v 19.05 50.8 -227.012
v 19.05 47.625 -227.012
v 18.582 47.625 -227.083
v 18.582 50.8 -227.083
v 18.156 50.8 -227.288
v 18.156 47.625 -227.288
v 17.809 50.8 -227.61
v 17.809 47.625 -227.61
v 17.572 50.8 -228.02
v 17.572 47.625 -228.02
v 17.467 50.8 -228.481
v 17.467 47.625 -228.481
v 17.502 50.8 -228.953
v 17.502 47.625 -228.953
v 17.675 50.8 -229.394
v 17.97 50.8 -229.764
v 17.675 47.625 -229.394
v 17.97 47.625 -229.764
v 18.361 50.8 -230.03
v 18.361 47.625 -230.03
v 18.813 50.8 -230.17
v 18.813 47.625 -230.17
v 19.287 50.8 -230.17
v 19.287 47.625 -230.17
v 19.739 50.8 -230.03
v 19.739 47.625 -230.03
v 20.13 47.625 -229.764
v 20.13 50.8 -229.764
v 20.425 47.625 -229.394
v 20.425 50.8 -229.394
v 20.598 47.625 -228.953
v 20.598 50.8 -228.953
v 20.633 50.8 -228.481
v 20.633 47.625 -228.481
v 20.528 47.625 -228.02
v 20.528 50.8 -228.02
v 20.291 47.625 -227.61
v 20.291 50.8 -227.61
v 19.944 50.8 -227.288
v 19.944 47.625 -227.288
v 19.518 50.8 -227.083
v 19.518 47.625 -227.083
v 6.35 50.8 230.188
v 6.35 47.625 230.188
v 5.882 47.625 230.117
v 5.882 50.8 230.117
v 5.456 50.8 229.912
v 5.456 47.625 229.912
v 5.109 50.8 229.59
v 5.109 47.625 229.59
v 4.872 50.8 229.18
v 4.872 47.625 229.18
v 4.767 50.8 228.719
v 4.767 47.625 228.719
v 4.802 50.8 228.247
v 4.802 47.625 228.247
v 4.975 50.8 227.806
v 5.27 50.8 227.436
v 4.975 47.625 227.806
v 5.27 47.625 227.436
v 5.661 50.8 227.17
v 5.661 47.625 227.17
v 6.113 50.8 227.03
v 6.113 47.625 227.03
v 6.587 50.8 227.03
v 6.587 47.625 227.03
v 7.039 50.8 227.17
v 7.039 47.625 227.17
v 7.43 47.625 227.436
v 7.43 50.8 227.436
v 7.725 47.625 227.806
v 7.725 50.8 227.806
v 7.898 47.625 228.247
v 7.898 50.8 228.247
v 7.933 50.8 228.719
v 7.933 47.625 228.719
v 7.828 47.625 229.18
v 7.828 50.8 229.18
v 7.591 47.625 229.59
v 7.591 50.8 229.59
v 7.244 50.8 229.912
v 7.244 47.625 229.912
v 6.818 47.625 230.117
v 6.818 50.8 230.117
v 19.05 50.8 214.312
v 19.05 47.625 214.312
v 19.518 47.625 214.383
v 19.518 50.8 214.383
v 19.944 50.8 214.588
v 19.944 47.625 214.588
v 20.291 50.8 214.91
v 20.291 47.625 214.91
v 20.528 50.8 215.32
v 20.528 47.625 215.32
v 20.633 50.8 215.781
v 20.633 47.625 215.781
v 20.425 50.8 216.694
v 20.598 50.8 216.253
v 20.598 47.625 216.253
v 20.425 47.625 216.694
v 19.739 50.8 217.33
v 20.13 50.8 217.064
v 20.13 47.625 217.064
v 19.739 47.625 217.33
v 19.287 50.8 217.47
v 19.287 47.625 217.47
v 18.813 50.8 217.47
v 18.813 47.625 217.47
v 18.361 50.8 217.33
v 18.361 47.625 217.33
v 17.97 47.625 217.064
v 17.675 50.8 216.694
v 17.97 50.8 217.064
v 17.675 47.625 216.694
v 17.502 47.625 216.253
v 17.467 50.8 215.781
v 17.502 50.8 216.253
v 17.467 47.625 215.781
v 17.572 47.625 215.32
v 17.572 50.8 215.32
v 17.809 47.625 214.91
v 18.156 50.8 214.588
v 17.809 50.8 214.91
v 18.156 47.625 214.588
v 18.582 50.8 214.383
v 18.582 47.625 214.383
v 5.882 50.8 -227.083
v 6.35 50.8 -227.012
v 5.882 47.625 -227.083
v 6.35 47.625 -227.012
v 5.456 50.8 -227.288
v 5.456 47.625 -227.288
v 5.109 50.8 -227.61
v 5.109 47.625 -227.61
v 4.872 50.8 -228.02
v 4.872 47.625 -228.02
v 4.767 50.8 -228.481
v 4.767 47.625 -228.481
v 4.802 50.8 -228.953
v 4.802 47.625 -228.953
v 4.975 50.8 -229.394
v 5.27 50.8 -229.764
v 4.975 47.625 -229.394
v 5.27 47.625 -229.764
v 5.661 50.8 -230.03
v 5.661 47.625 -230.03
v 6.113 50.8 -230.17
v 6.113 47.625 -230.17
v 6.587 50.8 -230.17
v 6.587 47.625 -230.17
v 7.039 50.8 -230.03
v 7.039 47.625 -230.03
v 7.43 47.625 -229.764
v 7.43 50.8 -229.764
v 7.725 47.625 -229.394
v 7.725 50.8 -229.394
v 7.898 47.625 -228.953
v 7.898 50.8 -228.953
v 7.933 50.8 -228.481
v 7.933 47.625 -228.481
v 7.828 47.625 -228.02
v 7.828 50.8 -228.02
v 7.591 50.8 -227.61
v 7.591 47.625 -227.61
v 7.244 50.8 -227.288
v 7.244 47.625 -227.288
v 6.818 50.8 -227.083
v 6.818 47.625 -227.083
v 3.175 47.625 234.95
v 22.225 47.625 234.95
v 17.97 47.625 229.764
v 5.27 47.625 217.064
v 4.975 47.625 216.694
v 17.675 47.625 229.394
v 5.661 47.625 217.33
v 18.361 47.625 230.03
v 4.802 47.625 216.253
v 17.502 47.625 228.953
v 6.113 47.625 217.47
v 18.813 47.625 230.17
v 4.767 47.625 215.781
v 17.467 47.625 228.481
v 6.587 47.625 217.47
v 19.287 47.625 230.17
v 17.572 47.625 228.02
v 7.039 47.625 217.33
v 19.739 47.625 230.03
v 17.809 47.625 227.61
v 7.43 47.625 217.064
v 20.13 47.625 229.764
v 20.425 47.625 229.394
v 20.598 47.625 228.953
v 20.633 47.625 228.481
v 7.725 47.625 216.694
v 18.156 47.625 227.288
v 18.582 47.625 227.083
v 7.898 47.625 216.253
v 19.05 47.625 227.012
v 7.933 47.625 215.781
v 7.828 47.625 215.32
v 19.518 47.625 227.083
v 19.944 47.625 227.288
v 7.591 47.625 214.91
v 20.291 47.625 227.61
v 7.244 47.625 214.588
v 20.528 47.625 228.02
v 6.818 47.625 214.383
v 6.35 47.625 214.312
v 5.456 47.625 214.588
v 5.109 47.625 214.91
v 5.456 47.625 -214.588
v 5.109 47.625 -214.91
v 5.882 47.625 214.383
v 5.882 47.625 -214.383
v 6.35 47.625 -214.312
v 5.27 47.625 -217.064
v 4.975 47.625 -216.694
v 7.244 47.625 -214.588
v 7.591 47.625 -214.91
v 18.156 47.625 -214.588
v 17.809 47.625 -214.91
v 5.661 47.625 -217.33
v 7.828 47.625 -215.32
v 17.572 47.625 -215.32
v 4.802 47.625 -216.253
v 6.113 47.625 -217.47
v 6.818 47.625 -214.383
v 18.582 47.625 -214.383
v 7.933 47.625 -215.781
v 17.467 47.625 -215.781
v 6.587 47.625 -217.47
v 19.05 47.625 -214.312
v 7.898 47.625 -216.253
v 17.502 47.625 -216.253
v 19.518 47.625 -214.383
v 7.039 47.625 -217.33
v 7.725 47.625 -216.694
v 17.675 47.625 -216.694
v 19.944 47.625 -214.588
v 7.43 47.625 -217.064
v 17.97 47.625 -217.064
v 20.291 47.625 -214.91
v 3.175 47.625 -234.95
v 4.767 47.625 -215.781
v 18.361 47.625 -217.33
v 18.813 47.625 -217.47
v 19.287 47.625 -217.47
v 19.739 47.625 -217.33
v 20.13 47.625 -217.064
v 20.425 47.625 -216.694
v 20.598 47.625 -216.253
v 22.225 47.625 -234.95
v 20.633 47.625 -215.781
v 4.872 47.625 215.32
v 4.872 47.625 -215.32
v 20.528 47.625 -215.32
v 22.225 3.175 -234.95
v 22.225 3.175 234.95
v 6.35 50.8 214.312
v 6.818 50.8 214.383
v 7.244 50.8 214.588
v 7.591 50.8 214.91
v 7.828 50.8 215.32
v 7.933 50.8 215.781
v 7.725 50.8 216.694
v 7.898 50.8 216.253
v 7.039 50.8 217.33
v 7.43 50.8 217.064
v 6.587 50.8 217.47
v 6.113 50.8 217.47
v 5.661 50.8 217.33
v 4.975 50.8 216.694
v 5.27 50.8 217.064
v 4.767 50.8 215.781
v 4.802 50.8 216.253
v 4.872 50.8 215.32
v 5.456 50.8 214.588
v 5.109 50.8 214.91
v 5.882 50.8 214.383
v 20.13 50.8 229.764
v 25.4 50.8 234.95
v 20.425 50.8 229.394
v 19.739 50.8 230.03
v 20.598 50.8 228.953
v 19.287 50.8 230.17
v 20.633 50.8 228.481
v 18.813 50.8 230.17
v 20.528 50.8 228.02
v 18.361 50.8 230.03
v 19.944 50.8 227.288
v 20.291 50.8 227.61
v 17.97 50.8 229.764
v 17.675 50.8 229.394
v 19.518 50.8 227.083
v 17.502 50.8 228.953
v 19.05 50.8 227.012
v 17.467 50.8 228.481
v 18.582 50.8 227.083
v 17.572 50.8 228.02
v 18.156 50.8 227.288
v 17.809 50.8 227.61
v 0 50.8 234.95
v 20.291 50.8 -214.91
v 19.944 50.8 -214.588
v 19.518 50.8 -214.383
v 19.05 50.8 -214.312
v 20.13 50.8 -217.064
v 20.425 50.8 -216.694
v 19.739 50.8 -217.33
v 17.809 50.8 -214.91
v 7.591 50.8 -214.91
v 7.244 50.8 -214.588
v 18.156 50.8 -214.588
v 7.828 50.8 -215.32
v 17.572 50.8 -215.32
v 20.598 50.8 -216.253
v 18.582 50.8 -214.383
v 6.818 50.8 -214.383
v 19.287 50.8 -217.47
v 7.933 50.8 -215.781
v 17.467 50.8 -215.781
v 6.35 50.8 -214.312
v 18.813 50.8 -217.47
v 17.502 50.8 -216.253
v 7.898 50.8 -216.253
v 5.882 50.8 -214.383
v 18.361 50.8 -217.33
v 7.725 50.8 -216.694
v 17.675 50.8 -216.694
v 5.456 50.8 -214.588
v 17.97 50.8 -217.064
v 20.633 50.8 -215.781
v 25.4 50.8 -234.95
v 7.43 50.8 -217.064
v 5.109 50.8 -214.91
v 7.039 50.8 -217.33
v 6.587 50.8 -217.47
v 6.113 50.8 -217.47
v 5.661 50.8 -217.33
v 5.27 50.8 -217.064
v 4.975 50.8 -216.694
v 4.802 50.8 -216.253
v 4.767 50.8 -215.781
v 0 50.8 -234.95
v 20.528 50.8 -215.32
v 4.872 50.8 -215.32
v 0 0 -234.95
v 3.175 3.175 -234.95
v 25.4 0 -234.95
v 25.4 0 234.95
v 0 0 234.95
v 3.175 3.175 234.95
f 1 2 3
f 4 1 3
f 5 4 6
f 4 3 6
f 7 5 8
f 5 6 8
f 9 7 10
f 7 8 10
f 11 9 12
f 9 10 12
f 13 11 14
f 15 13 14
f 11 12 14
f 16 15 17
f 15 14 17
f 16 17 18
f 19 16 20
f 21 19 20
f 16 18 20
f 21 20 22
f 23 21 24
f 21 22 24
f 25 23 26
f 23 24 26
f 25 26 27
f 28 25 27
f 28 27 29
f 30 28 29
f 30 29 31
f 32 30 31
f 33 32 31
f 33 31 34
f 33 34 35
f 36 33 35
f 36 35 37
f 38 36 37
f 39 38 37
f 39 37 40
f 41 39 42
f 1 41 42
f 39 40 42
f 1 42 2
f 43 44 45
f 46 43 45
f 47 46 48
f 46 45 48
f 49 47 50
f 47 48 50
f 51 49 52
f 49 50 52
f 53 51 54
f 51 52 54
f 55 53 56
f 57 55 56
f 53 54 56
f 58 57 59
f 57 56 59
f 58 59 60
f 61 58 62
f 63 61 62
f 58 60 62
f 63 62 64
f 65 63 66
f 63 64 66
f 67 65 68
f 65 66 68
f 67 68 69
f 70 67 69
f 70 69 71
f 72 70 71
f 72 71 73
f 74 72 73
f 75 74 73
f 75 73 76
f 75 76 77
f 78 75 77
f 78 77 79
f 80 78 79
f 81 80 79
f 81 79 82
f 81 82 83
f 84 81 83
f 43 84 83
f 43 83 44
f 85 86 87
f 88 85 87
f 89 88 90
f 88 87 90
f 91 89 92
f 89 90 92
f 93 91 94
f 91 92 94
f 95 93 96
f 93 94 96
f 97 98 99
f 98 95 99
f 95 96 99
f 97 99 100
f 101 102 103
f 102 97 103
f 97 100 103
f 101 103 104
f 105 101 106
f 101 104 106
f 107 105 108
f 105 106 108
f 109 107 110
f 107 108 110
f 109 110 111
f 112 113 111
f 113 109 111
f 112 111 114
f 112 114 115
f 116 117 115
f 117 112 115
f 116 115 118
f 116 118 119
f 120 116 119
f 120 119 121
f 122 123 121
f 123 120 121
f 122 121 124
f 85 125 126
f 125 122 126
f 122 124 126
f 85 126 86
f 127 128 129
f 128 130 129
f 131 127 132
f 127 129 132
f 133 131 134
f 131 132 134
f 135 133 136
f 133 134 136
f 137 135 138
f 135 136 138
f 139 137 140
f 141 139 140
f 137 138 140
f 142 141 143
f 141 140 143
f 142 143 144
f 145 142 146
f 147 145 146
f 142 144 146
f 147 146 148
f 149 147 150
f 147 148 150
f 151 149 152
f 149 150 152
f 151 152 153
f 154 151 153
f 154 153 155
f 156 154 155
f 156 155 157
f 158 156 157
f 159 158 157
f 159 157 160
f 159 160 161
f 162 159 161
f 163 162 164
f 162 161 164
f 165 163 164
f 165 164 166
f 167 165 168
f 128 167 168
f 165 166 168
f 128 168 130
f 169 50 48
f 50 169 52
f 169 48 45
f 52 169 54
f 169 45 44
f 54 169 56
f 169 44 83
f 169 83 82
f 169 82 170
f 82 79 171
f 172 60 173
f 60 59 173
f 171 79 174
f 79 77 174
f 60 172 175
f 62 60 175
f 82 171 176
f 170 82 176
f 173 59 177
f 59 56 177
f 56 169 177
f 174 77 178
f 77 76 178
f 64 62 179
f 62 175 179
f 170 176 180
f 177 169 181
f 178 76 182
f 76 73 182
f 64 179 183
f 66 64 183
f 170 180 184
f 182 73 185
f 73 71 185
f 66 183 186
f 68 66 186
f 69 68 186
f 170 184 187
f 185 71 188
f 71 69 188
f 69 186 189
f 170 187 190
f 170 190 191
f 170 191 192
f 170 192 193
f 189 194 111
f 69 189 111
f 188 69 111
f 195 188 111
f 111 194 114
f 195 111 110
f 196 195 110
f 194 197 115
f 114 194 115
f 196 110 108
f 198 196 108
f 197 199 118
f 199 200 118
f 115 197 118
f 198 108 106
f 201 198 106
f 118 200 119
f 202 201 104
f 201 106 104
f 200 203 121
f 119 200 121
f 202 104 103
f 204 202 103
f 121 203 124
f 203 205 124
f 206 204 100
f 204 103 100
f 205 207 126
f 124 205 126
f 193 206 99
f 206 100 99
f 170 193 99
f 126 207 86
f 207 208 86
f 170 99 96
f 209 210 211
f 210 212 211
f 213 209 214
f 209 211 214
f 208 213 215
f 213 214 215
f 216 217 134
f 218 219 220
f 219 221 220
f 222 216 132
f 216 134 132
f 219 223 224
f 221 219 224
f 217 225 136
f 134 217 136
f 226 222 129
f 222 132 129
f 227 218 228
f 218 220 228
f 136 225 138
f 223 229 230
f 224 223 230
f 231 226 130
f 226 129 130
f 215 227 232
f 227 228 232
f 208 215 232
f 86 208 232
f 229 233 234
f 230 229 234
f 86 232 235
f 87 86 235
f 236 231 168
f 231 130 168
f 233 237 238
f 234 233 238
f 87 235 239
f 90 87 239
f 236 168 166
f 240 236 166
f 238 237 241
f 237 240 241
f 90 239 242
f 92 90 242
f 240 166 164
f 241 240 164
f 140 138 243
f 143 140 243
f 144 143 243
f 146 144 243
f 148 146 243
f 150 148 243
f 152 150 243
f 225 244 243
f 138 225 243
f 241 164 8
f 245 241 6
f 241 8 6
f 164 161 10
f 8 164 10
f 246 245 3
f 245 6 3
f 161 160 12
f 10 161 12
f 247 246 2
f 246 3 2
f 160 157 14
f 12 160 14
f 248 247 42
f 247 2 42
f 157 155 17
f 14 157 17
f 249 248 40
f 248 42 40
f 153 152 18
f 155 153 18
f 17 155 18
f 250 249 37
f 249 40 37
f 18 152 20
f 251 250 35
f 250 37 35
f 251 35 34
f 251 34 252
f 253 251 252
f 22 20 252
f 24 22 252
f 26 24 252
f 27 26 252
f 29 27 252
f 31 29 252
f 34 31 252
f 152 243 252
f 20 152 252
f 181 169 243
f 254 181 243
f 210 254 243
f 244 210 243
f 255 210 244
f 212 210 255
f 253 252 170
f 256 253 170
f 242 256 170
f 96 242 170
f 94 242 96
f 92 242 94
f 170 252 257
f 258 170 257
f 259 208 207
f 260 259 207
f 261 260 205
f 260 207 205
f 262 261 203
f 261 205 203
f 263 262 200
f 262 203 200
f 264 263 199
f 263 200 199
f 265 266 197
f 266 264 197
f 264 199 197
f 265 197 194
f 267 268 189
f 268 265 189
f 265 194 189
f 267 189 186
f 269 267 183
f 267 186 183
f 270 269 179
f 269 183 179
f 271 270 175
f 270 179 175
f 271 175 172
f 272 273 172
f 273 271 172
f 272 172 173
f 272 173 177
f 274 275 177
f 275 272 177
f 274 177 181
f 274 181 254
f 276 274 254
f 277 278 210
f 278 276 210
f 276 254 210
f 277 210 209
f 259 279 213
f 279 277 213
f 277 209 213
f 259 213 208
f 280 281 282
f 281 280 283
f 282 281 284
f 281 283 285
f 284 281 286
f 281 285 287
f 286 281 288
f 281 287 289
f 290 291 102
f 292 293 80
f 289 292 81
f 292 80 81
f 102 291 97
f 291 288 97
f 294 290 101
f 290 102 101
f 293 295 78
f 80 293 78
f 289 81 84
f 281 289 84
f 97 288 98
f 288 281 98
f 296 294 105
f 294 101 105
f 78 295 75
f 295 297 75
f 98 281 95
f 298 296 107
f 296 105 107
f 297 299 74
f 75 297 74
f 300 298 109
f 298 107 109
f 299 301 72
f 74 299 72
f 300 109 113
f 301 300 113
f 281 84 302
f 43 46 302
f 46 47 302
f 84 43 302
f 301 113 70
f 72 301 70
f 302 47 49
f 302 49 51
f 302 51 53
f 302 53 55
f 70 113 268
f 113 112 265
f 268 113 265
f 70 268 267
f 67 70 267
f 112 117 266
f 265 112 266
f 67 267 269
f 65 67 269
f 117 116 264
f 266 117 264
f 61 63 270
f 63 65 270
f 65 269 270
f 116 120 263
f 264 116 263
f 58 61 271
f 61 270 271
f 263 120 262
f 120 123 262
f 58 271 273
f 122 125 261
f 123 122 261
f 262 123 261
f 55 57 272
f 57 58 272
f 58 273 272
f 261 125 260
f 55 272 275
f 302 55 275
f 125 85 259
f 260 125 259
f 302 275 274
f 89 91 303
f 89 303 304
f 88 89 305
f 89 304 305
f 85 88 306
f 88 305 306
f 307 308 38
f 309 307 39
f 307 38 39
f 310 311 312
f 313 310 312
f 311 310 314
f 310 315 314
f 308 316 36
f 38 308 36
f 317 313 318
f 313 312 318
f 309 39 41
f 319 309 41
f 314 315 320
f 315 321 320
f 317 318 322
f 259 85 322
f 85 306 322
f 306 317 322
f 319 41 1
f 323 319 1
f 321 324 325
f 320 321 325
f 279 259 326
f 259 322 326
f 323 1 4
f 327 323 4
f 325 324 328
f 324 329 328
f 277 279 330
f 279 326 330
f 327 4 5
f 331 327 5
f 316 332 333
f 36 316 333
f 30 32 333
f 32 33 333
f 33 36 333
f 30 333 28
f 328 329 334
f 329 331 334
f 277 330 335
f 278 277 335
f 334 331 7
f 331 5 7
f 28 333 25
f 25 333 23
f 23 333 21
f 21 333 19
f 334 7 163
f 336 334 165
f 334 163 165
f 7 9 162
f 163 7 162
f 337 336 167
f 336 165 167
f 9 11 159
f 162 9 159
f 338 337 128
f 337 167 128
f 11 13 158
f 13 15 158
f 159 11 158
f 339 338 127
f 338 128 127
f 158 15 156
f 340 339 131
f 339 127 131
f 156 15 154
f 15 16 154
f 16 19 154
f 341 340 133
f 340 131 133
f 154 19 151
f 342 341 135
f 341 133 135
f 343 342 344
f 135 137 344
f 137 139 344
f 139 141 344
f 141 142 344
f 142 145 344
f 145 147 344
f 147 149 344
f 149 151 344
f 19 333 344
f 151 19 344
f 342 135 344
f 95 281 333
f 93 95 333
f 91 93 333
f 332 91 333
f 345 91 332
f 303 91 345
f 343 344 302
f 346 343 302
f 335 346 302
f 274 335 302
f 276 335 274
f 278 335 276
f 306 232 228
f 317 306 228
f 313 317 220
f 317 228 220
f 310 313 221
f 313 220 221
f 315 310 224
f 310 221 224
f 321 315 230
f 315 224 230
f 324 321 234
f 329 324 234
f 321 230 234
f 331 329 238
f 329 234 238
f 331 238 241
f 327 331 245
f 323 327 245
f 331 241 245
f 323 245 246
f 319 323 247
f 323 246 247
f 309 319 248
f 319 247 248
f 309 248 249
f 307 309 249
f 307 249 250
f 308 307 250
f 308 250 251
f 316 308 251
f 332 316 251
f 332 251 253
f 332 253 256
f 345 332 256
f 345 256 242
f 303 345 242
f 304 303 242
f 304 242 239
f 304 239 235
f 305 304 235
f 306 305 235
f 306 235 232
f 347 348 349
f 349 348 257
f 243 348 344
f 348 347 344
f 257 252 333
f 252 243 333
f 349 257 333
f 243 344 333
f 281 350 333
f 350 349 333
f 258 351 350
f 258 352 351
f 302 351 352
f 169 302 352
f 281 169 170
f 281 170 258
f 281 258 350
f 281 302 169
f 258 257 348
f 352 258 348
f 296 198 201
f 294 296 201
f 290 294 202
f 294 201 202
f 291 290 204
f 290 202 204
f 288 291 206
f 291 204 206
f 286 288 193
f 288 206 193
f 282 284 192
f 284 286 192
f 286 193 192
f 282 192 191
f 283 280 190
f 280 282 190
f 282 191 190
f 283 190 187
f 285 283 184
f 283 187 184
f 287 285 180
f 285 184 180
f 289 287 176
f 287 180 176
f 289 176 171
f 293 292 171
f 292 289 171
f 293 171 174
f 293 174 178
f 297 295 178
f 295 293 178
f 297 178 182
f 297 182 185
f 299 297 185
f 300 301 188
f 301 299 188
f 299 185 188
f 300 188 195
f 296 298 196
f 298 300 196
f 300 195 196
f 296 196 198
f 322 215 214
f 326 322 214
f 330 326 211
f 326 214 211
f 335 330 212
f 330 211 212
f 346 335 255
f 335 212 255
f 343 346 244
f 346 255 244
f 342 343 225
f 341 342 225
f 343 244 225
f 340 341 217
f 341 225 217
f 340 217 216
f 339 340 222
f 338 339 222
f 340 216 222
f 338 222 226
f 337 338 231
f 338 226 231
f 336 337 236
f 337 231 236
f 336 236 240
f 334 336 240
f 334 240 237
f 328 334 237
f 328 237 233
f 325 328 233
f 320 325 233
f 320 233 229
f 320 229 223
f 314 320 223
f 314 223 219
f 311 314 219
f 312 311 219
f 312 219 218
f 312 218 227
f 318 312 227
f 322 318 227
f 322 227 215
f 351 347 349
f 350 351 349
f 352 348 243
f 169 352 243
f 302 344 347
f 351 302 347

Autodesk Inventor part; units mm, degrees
ref_plane "YZ Plane" through (0, 0, 0) normal (1, 0, 0) x (0, 1, 0)
ref_plane "XZ Plane" through (0, 0, 0) normal (0, 1, 0) x (-1, 0, 0)
ref_plane "XY Plane" through (0, 0, 0) normal (0, 0, 1) x (1, 0, 0)
sketch "Sketch1" plane through (0, 0, 0) normal (0, 0, 1) x (1, 0, 0)
  line L0 (0, 0) -> (25.4, 0)
  line L1 (25.4, 0) -> (25.4, 50.8)
  line L2 (25.4, 50.8) -> (0, 50.8)
  line L3 (0, 50.8) -> (0, 0)
  line L4 (3.175, 47.625) -> (22.225, 47.625)
  line L5 (22.225, 47.625) -> (22.225, 3.175)
  line L6 (22.225, 3.175) -> (3.175, 3.175)
  line L7 (3.175, 3.175) -> (3.175, 47.625)
  dimension "d0" = 25.4
  dimension "d1" = 50.8
  dimension "d2" = 3.175
extrude "Beam" add sketch "Sketch1" along normal mid plane 469.9
sketch "Sketch2" plane through (0, 50.8, -234.95) normal (0, 1, 0) x (1, 0, 0)
  line L0 (0, 0) -> (25.4, 0) projected
  line L1 (0, 0) -> (0, -469.9) projected
  point P0 (6.35, -6.35)
  dimension "d5" = 6.35
  dimension "d6" = 6.35
hole "Rivet Hole" at (6.35, 50.8, -228.6) direction (0, -1, 0) diameter 3.175 end up to surface
pattern_linear "Rivet Holes" count 2 spacing 12.7 along (1, 0, 0) count 2 spacing 12.7 along (0, 0, 1) of "Rivet Hole"
mirror "Rivet Holes Mirrored" about plane through (0, 0, 0) normal (0, 0, 1) of "Rivet Hole", "Rivet Holes"
properties part number "Back Beam"
